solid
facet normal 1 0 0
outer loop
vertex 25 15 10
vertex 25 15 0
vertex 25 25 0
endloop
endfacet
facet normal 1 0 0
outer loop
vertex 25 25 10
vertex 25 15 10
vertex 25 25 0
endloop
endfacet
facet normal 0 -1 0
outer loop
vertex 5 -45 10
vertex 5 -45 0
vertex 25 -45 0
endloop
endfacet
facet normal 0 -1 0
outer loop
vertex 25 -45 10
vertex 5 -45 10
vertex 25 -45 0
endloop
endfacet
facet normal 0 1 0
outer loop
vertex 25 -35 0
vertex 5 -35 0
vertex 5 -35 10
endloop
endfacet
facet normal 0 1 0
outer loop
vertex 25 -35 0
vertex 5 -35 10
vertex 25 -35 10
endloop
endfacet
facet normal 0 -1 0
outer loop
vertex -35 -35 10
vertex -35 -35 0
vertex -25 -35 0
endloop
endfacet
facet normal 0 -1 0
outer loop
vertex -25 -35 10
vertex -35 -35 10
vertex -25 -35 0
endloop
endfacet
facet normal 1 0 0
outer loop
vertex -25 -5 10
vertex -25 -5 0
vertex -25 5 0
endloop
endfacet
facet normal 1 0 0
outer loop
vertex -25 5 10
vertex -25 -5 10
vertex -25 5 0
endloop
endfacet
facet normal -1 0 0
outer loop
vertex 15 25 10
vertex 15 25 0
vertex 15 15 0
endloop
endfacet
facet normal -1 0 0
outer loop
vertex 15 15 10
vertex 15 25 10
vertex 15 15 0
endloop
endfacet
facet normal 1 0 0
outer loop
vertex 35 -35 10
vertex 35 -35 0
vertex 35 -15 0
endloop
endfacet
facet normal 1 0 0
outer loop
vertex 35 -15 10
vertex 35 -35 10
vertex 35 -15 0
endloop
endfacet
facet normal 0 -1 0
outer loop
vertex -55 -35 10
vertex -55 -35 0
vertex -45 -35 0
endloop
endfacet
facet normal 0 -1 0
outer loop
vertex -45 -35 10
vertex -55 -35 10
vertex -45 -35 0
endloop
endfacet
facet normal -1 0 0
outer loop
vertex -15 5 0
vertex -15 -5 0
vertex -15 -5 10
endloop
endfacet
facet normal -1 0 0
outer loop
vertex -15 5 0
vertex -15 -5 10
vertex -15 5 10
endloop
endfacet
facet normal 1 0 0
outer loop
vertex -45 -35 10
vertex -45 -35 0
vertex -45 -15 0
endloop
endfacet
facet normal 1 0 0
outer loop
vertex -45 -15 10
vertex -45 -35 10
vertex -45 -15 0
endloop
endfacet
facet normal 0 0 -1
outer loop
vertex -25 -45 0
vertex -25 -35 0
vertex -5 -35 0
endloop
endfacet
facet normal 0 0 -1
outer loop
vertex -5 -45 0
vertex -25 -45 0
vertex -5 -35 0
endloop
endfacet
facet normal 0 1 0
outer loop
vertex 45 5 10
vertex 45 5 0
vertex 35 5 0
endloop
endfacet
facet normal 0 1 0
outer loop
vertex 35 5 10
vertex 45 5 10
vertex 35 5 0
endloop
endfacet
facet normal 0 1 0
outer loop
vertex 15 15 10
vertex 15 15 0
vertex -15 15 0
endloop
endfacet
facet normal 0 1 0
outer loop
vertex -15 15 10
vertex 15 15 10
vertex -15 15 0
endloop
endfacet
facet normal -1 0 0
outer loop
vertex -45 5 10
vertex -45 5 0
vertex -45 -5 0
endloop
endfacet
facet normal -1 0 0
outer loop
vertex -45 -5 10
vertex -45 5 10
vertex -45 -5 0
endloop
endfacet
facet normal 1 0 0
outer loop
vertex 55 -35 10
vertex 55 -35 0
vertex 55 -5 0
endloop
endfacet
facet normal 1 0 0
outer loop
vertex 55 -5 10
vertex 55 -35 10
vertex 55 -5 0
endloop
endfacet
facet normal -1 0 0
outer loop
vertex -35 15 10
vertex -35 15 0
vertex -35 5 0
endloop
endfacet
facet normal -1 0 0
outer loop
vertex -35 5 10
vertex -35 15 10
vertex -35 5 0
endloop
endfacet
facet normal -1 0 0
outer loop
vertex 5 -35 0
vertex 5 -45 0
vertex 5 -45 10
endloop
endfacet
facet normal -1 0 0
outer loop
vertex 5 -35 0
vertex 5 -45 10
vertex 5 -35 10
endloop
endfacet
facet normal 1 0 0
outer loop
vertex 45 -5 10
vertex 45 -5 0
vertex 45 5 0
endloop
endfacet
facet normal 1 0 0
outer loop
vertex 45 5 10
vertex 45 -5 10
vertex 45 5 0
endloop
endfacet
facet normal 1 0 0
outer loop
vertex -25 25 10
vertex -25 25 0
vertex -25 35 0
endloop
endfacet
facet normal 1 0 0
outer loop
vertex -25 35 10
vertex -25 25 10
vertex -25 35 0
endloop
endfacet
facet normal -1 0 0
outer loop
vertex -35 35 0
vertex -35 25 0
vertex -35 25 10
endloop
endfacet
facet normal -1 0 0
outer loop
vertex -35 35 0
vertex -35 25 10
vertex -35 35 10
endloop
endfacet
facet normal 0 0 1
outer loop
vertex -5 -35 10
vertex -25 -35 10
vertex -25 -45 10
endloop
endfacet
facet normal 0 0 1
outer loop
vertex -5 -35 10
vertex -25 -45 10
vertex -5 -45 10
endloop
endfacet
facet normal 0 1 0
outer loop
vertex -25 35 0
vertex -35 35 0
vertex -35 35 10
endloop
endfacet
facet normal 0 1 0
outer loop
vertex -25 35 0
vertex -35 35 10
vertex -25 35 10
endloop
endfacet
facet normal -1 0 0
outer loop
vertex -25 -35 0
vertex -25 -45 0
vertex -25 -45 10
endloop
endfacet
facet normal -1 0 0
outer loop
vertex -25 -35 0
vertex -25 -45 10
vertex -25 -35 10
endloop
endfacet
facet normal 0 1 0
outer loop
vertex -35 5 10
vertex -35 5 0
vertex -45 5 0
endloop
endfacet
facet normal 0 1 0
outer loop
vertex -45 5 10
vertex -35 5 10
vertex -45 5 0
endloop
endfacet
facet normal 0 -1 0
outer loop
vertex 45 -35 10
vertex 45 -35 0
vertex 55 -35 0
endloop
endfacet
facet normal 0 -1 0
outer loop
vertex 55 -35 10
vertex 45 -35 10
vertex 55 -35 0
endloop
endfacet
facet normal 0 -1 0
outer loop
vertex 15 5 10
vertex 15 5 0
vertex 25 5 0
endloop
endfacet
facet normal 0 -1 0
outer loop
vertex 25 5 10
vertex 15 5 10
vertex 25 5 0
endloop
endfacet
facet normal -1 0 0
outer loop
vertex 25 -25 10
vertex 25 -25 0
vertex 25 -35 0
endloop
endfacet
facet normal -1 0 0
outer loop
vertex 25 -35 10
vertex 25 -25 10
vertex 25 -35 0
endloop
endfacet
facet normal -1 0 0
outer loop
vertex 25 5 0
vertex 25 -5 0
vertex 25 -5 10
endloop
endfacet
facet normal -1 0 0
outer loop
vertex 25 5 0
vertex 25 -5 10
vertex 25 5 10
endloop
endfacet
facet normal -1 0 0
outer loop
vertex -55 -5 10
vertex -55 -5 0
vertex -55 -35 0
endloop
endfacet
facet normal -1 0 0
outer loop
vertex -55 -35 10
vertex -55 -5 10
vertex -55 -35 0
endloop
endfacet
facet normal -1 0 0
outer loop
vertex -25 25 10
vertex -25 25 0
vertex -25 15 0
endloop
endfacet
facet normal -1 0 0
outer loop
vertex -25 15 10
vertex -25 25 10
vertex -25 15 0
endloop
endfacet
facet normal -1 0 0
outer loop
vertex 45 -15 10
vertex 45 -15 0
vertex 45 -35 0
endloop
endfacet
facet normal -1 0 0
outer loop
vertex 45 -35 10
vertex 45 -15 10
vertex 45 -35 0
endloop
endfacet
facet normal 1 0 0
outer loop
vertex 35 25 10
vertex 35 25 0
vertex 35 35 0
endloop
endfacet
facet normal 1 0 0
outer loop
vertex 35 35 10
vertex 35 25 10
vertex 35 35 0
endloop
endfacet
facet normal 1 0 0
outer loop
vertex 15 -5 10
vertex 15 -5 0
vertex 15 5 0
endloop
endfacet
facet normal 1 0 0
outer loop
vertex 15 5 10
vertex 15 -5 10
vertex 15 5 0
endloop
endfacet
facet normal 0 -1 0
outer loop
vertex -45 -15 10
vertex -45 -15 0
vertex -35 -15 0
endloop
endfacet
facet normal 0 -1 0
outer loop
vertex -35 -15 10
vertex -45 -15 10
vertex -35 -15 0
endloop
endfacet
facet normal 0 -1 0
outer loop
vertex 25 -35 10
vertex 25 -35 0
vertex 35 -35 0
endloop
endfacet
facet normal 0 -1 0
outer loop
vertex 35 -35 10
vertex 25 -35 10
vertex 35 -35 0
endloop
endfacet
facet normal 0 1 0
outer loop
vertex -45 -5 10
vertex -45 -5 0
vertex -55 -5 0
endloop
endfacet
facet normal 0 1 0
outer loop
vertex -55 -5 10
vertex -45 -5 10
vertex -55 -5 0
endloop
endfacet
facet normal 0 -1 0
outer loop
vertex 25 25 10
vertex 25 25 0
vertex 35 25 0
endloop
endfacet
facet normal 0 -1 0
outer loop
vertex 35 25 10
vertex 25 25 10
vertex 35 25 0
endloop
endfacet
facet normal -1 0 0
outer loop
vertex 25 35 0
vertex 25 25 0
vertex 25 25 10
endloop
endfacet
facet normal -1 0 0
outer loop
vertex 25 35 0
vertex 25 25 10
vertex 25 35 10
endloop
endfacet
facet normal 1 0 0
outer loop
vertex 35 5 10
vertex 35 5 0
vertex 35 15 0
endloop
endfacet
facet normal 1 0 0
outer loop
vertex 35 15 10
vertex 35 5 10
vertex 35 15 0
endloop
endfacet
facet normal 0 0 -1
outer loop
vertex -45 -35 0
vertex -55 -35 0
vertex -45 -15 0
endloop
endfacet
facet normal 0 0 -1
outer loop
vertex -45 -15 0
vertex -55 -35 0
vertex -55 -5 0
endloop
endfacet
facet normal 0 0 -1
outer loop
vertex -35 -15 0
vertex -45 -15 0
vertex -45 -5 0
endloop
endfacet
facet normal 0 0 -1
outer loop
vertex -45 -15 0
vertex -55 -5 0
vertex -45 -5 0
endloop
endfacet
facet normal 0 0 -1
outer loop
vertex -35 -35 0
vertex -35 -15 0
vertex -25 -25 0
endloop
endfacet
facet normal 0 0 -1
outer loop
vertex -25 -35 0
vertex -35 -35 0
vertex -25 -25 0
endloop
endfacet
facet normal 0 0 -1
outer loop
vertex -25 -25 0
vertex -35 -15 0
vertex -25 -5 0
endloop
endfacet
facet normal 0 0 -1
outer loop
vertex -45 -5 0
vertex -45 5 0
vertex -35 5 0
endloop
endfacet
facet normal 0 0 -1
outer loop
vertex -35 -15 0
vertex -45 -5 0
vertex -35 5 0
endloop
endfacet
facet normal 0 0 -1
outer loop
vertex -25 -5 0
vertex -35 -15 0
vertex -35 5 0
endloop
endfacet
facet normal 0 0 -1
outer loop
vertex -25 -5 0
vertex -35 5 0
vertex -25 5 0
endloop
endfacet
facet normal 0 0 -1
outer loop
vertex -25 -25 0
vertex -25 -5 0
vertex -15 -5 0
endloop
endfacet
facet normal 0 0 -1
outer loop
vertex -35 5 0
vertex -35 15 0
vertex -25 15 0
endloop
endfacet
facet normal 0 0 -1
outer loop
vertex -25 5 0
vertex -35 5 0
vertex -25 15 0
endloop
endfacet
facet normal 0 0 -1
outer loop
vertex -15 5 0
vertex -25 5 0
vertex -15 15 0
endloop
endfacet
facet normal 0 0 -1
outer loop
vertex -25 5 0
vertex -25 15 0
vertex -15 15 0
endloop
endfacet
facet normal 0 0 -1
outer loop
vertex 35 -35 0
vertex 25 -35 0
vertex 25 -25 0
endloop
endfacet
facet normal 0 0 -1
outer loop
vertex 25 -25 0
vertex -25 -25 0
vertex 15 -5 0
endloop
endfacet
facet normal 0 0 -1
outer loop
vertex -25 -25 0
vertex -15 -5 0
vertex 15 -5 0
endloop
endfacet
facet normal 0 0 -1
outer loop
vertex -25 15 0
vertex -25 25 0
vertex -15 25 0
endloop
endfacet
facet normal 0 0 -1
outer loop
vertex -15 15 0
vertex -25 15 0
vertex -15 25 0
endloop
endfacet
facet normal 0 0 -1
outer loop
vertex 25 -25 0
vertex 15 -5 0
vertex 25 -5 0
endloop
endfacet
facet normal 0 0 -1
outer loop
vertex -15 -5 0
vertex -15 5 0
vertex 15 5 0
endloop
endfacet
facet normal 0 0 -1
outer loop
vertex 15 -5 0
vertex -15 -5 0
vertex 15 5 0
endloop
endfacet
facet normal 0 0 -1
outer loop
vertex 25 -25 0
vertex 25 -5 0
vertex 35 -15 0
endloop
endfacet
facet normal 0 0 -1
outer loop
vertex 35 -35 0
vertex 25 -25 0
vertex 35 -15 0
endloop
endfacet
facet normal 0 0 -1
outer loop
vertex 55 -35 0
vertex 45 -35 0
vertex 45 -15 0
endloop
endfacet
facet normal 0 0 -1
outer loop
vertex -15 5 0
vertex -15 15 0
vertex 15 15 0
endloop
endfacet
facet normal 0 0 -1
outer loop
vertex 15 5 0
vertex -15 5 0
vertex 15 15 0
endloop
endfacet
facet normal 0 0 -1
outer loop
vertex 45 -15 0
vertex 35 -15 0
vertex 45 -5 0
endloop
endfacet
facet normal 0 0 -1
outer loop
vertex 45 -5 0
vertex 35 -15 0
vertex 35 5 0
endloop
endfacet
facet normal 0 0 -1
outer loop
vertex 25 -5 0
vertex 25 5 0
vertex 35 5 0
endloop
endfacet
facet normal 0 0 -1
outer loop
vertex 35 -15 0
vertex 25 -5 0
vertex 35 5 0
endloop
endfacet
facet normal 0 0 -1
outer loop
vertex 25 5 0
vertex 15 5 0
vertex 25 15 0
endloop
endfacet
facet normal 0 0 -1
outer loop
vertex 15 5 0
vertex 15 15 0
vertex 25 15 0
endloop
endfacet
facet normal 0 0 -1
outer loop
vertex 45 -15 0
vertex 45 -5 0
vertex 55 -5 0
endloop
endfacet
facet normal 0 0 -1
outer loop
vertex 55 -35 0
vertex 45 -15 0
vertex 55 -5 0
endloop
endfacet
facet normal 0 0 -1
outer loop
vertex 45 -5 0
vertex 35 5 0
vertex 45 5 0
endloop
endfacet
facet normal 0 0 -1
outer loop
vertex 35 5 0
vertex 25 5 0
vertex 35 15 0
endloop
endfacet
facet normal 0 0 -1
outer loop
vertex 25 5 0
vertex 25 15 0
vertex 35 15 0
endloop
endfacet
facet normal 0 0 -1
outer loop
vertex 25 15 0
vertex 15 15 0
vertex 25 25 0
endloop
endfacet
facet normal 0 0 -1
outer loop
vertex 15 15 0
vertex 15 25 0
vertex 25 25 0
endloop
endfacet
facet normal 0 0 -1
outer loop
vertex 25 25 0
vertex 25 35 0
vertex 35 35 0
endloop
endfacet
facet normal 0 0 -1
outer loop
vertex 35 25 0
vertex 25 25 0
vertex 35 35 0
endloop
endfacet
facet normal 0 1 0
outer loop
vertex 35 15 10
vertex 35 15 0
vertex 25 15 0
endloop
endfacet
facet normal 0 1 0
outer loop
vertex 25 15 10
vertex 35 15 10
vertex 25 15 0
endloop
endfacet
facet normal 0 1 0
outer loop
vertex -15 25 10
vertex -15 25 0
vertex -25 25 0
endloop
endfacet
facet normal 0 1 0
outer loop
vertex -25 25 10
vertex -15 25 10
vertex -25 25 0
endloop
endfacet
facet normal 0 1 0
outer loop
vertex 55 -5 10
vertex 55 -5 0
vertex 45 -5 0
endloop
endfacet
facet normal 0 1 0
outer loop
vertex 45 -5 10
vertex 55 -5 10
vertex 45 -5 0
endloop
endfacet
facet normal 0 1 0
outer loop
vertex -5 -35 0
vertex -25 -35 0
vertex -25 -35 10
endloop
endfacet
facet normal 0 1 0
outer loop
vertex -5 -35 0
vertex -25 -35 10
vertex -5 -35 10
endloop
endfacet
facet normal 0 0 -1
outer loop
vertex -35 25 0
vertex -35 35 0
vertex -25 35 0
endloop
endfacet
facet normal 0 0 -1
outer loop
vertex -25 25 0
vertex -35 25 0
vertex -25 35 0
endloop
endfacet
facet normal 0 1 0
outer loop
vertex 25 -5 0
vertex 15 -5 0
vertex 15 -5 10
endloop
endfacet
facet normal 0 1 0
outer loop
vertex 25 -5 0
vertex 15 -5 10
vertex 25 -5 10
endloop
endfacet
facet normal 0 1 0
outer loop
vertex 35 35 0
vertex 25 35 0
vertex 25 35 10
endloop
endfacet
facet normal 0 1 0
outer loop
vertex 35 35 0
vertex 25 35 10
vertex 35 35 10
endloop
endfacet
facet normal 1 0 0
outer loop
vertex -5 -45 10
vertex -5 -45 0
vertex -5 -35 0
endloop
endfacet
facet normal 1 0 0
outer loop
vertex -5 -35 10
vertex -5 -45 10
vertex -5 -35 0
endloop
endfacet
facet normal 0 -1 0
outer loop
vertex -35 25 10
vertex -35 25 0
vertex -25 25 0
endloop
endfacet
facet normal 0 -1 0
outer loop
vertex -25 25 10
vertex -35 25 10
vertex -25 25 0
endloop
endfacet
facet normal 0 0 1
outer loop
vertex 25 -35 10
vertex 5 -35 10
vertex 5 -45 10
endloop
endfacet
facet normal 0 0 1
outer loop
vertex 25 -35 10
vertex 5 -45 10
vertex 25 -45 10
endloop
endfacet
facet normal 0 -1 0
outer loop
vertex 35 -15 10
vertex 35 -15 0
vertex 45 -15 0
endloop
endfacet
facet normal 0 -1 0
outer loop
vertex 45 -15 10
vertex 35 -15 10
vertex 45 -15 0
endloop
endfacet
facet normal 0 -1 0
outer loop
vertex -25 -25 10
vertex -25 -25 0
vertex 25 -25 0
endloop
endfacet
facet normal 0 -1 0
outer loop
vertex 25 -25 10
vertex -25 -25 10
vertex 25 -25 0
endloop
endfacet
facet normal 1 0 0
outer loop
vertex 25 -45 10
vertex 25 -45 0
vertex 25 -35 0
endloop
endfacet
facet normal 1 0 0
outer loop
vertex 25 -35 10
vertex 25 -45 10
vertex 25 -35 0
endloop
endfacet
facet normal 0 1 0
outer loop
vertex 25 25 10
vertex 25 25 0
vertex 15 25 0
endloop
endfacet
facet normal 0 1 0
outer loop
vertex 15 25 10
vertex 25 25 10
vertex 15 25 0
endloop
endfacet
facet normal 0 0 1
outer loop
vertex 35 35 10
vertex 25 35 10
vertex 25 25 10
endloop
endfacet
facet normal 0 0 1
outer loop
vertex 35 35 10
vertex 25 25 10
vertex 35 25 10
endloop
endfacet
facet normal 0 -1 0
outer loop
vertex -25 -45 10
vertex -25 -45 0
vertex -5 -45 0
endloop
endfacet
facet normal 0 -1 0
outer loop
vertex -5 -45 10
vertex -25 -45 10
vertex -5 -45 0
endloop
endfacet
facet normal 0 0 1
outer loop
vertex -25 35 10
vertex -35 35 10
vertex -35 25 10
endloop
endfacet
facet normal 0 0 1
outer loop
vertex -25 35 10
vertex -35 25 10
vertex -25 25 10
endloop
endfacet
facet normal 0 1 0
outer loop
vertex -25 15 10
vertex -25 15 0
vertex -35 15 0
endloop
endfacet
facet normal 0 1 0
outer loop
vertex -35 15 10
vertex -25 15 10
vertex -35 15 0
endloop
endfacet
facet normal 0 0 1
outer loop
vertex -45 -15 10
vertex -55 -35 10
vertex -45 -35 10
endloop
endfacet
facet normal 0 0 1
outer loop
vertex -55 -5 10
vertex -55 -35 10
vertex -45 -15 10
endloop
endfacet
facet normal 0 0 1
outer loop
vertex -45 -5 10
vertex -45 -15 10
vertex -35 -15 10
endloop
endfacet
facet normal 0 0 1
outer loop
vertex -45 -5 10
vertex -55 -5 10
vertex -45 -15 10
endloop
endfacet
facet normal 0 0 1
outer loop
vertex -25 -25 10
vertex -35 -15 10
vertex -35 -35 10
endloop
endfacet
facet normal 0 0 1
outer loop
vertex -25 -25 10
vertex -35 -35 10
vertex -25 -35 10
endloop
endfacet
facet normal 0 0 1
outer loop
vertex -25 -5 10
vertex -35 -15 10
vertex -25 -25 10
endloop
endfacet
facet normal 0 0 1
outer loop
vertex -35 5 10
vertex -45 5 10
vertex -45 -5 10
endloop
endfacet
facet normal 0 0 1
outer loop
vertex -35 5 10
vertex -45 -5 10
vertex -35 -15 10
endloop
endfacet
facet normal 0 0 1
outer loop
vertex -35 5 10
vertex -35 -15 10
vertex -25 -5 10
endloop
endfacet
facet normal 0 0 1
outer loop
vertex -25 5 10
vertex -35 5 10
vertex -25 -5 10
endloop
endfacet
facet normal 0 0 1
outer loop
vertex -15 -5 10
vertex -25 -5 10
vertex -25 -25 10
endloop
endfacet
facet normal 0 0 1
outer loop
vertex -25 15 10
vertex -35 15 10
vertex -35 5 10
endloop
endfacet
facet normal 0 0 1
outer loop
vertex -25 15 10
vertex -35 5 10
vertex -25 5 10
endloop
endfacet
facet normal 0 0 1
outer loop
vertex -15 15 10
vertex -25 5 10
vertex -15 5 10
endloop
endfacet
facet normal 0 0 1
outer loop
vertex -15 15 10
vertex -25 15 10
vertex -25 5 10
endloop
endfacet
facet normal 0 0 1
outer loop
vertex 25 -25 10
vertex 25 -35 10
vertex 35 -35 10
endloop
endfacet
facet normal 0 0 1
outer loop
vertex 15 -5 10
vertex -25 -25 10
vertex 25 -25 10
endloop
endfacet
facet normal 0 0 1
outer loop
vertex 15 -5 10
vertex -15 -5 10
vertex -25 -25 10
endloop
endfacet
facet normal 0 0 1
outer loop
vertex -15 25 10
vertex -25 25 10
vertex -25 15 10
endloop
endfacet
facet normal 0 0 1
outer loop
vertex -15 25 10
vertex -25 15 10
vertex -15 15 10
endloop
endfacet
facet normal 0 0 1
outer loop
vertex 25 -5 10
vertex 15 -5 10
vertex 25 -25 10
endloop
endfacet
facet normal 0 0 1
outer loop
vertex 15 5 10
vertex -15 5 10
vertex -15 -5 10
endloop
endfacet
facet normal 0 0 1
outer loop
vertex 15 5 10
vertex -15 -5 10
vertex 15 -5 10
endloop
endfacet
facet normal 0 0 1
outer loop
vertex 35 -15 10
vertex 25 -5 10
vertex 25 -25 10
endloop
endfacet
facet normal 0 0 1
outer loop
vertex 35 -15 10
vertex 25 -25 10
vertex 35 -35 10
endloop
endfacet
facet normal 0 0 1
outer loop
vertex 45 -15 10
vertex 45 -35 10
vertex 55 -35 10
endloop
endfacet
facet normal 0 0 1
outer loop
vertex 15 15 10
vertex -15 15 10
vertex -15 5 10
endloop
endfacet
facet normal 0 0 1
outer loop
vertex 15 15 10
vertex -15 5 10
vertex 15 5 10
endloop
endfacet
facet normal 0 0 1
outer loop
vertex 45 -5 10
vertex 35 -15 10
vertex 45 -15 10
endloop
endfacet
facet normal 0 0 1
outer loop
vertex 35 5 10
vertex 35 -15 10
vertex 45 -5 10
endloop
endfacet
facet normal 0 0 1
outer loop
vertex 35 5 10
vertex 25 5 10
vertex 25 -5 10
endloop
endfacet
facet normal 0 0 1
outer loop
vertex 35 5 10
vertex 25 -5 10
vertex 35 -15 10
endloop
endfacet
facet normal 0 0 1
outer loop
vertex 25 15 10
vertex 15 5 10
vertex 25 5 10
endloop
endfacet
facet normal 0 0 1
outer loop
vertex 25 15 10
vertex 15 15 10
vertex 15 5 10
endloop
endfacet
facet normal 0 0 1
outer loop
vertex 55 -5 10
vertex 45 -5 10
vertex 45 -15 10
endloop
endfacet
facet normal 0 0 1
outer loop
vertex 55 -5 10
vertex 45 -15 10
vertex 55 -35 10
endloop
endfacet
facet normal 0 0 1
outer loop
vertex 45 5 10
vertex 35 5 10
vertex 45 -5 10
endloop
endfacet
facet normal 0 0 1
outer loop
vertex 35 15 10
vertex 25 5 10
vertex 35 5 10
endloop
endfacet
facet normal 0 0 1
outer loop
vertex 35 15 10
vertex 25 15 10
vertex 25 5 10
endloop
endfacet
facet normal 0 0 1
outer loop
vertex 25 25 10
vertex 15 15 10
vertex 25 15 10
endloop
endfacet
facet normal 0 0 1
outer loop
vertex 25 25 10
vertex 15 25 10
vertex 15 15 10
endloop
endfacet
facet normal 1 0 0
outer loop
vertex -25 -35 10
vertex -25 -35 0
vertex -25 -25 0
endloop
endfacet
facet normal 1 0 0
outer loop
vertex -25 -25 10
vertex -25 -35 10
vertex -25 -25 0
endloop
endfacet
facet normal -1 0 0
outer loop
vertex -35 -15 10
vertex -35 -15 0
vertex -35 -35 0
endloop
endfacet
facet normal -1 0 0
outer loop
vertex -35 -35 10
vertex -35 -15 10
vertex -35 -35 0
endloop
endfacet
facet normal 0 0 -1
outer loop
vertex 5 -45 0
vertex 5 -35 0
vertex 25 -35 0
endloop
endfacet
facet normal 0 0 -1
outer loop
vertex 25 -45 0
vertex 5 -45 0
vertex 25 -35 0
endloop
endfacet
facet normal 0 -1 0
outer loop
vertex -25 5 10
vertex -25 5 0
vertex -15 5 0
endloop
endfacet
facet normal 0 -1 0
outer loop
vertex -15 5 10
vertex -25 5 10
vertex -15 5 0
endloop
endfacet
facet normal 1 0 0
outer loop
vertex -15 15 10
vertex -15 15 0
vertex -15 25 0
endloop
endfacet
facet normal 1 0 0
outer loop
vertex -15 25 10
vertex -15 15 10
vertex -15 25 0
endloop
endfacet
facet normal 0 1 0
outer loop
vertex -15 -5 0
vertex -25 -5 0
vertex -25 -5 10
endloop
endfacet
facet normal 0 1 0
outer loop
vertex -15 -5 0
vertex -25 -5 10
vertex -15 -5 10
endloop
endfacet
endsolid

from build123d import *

# Parameters (mm, degrees)
F0_W     = 10
F0_H     = 10
F0_W_2   = 20
F1_DEPTH = 10


with BuildPart() as f1:
    # F0 (on Top) → F1 (new body)
    with BuildSketch(Plane.XY):
        Polygon((15, 15), (-15, 15), (-15, 25), (-25, 25), (-25, 15), (-35, 15), (-35, 5), (-45, 5), (-45, -5), (-55, -5), (-55, -35), (-45, -35), (-45, -15), (-35, -15), (-35, -35), (-25, -35), (-25, -25), (25, -25), (25, -35), (35, -35), (35, -15), (45, -15), (45, -35), (55, -35), (55, -5), (45, -5), (45, 5), (35, 5), (35, 15), (25, 15), (25, 25), (15, 25), align=None)
        with Locations((-20, 0)):
            Rectangle(F0_W, F0_H, mode=Mode.SUBTRACT)
        with Locations((20, 0)):
            Rectangle(F0_W, F0_H, mode=Mode.SUBTRACT)
        with Locations((-30, 30)):
            Rectangle(F0_W, F0_H)
        with Locations((-15, -40)):
            Rectangle(F0_W_2, F0_H)
        with Locations((30, 30)):
            Rectangle(F0_W, F0_H)
        with Locations((15, -40)):
            Rectangle(F0_W_2, F0_H)
    extrude(amount=F1_DEPTH)


solid = f1.part
